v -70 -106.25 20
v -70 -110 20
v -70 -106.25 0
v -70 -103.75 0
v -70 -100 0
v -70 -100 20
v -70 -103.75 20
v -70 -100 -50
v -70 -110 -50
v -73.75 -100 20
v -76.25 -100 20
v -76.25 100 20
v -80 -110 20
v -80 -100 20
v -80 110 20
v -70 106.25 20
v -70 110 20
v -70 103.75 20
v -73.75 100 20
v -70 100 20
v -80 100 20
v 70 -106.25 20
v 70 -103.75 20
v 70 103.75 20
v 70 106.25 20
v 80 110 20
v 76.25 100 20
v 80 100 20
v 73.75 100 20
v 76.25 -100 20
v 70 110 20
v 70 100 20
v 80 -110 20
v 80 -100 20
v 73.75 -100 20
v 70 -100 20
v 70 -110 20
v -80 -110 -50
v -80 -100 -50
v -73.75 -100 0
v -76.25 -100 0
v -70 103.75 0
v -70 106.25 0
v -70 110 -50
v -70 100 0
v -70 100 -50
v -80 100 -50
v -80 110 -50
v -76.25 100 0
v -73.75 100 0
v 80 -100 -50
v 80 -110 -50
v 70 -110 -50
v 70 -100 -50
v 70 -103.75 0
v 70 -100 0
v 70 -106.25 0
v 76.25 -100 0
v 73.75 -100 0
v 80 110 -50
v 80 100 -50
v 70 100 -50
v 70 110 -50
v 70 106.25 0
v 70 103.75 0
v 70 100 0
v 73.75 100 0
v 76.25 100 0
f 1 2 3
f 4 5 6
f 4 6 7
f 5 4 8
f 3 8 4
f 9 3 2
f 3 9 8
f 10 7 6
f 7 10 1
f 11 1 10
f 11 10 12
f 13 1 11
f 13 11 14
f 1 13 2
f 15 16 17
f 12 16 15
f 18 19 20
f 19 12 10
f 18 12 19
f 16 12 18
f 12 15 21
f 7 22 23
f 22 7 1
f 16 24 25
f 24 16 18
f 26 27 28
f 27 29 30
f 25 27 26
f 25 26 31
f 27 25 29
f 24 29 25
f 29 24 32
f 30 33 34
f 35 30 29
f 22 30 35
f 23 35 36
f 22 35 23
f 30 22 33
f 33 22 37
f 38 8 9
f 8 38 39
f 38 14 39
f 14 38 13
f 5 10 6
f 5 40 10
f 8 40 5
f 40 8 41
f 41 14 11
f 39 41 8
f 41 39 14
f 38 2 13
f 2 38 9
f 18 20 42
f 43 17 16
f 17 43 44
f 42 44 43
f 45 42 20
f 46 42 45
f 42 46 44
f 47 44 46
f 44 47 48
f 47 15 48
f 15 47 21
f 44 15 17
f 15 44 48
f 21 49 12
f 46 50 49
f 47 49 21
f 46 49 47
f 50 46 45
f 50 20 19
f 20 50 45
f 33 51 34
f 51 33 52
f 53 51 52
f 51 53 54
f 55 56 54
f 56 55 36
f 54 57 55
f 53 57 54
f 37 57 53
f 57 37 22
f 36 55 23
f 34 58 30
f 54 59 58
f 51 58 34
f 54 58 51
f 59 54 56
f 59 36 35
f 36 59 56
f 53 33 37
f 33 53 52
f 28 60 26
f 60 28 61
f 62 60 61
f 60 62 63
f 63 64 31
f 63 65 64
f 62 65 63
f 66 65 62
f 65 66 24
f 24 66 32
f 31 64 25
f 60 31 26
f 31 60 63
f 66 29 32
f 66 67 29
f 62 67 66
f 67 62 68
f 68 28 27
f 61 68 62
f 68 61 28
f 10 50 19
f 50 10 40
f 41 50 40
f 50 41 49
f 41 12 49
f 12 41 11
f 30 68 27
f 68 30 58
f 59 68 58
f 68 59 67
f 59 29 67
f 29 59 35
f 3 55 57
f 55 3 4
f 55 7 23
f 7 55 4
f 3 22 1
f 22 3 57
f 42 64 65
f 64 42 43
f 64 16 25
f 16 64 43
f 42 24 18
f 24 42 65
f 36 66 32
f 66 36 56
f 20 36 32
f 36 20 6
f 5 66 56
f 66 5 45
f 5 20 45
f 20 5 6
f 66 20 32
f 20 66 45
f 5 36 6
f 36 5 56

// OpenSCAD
// file: human.scad
module halfHumanShape() {
    polygon([
        /* leg */
        [-20,0], [-10,0], [0,90], /*[-15,90],*/
        /* up to the neck */
        [0,165], [-5,165], [-5,155], [-25,155],
        /* arm */
        [-40,75], [-30,75], [-18,140]
    ]);
}

module human() {
    color("pink")
    translate([40,10,0])
    rotate([90,0,0])
    linear_extrude(10) {
        halfHumanShape();
        mirror([1,0]) halfHumanShape();
        /* head */
        translate([0,175]) circle(d=30);
    }
}
// main file
include <human.scad>;

/*
 * Stollenbauweise
 * Quermutterbolzen + Holzdübel
 * Rollbretter unter dem Bett
 * https://www.johannes-strommer.com/rechner/balkenberechnung/
 * TODO: Brett am Kopfende?
 * TODO: Beine nach oben erweitern?
 * TODO: Dach?
 */

/* cm */
L = 320; /* overall length */
MW = 140; /* mattress width */
ML = 200; /* mattress length */
MH = 20; /* mattress height */
LX = 10; /* TODO: leg X size */
LY = 10; /* TODO: leg Y size */
LH = 70; /* leg height */
SBD1 = 2.5; /* TODO: smaller side board dimension */
SBD2 = 20; /* TODO: larger side board dimension */

/* mattress */
color("gray") translate([0,0,MH/2]) cube([MW,ML,MH], center=true);

/* legs */
color("red") translate([0,0,-LH/2+MH]) for (i=[-1,1]) {
    translate([i*(MW+LX)/2,0,0]) {
        for (j=[-1,1]) {
            translate([0,j*(ML+LY)/2,0]) cube([LX,LY,LH], center=true);
        }
    }
}

color("red") translate([0,0,MH-SBD2/2]) {
    /* longer side boards */
    for (i=[-1,1]) {
        translate([i*(MW+LX)/2,0,0]) cube([SBD1,ML,SBD2], center=true);
    }

    /* shorter side boards */
    for (i=[-(ML+LX)/2,(ML+LX)/2]) {
        translate([0,i,0]) cube([MW,SBD1,SBD2], center=true);
    }
}

/* humans */
module centeredHuman() {
    translate([-40,95,10]) rotate([90,0,0]) human();
}
//centeredHuman();
//translate([0,(ML+PL)/2,0]) rotate([0,0,90]) centeredHuman();
